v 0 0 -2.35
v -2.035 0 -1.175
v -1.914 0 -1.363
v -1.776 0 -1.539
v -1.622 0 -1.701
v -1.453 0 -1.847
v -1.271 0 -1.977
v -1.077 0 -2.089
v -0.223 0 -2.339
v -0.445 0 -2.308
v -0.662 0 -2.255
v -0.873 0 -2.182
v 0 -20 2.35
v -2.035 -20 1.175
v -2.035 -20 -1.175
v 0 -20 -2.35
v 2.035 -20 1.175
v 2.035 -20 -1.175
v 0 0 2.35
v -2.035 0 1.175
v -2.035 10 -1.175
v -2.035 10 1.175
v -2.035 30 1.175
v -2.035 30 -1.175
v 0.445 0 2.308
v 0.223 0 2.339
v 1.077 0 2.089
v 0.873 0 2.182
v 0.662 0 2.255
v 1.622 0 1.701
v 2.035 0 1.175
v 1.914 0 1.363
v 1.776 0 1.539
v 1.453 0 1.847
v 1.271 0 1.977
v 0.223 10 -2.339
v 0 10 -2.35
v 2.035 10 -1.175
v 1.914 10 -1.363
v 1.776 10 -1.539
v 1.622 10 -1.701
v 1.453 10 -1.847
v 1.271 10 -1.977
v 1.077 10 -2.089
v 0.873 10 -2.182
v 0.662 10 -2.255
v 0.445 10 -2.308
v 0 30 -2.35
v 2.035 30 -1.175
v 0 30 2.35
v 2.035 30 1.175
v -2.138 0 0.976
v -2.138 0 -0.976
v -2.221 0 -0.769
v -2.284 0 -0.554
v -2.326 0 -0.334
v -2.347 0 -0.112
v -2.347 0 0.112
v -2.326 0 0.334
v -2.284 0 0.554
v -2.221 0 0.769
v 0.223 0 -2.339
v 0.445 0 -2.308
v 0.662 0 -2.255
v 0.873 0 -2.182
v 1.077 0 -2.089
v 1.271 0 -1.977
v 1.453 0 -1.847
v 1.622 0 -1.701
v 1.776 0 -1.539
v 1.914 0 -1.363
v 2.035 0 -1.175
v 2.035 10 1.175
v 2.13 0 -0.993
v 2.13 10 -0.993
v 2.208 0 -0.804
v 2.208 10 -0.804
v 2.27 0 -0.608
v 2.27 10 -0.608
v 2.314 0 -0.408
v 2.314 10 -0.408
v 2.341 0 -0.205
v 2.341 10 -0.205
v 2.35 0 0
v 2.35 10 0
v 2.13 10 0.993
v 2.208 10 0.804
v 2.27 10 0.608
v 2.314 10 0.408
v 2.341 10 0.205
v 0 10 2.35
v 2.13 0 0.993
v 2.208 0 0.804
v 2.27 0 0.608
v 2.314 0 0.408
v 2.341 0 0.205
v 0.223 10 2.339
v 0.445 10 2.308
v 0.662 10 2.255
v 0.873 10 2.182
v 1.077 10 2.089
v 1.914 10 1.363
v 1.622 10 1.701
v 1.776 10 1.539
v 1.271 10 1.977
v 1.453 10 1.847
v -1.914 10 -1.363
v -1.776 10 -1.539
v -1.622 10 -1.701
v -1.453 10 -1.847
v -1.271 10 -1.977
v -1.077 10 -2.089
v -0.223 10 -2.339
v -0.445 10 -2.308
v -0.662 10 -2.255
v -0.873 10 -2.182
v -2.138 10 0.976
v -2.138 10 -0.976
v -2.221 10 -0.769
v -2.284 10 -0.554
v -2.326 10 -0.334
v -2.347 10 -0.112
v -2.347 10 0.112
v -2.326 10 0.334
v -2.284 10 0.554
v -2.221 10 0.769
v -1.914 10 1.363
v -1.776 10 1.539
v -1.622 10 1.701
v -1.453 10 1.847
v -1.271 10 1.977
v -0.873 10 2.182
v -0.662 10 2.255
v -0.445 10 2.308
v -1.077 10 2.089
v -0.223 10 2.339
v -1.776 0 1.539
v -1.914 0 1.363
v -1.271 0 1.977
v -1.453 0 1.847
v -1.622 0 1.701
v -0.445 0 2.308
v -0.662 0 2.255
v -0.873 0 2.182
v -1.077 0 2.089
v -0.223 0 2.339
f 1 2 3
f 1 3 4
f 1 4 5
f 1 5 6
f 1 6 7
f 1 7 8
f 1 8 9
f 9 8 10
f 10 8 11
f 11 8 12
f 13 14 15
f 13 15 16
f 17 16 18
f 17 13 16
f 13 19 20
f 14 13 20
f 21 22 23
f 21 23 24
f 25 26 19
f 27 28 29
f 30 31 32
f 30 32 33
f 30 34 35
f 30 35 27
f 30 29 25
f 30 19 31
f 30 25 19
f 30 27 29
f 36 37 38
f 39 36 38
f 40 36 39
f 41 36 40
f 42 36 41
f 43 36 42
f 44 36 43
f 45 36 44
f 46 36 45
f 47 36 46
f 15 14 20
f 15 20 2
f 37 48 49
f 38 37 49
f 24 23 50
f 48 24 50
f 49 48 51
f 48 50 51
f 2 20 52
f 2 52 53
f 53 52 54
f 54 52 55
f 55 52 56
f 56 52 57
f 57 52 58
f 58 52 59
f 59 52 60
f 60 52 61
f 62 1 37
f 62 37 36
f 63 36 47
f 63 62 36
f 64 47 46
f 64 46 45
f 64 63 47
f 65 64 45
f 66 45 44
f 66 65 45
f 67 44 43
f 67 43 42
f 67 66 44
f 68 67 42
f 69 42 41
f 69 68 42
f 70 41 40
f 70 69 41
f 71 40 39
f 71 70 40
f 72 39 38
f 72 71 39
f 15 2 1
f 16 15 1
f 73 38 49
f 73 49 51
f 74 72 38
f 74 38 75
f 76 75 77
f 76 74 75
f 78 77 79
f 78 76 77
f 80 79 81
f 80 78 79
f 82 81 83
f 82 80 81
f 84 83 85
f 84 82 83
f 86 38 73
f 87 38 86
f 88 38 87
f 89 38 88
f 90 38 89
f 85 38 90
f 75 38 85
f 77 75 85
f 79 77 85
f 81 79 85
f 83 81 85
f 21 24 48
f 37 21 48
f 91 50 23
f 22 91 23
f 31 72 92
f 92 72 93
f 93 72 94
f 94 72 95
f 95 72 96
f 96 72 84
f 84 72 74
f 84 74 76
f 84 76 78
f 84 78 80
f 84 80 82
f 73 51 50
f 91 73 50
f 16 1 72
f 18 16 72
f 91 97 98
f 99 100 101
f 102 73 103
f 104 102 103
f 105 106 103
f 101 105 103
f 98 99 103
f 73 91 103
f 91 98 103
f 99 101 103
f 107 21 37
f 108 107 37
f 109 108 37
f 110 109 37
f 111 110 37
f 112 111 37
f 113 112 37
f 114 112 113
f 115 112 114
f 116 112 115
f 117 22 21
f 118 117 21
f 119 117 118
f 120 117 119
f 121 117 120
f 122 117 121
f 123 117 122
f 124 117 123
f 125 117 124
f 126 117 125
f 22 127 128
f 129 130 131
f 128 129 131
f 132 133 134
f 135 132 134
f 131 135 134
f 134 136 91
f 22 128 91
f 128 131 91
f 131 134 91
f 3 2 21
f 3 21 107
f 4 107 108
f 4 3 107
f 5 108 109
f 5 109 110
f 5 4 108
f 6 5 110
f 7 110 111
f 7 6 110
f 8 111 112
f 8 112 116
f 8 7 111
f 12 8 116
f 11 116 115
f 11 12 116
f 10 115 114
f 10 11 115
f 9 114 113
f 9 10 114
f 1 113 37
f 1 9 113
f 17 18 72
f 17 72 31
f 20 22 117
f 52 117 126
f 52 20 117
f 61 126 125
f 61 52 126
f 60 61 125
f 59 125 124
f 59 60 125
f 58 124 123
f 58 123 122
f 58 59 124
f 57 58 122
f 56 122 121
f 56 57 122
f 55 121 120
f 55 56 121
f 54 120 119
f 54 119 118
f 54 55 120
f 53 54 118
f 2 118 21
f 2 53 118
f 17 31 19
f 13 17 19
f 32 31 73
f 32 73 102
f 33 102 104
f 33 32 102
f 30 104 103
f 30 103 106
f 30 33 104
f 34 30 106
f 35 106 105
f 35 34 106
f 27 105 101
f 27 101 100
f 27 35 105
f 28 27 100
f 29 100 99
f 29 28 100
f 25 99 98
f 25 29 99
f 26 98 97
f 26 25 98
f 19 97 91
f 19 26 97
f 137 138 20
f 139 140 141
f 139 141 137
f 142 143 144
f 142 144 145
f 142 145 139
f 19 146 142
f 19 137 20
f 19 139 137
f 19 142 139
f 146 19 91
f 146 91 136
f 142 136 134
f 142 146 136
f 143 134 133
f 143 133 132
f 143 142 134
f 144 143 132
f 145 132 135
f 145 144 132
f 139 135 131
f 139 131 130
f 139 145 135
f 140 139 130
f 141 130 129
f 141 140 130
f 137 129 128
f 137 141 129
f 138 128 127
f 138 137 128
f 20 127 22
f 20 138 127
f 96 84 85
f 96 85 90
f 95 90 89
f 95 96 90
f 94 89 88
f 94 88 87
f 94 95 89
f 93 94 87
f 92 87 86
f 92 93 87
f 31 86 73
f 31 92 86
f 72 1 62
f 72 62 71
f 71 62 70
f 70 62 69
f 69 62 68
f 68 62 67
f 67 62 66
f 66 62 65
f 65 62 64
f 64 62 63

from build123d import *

# Parameters (mm, degrees)
F1_DEPTH      = 20
F1_DEPTH_BACK = 30
F2_DEPTH      = 10


with BuildPart() as f1:
    # F0 (on Front) → F1 (new body, two sides)
    with BuildSketch(Plane.XZ) as f1_sk:
        Polygon((2.03516, -1.175), (2.03516, 1.175), (0, 2.35), (-2.03516, 1.175), (-2.03516, -1.175), (0, -2.35), align=None)
    extrude(amount=F1_DEPTH)
    extrude(f1_sk.sketch, amount=-F1_DEPTH_BACK)

    # F0 (on Front) → F2 (join)
    with BuildSketch(Plane.XZ):
        with BuildLine():
            Line((-2.03516, 1.175), (0, 2.35))
            ThreePointArc((0, 2.35), (-1.175, 2.03516), (-2.03516, 1.175))
        make_face()
        with BuildLine():
            Line((0, 2.35), (2.03516, 1.175))
            ThreePointArc((2.03516, 1.175), (1.175, 2.03516), (0, 2.35))
        make_face()
        with BuildLine():
            ThreePointArc((2.03516, -1.175), (2.269926, -0.608225), (2.35, 0))
            ThreePointArc((2.35, 0), (2.269926, 0.608225), (2.03516, 1.175))
            Line((2.03516, 1.175), (2.03516, -1.175))
        make_face()
        with BuildLine():
            ThreePointArc((0, -2.35), (1.175, -2.03516), (2.03516, -1.175))
            Line((2.03516, -1.175), (0, -2.35))
        make_face()
        Polygon((2.03516, -1.175), (2.03516, 1.175), (0, 2.35), (-2.03516, 1.175), (-2.03516, -1.175), (0, -2.35), align=None)
        with BuildLine():
            Line((-2.03516, -1.175), (-2.03516, 1.175))
            ThreePointArc((-2.03516, 1.175), (-2.35, 0), (-2.03516, -1.175))
        make_face()
        with BuildLine():
            ThreePointArc((-2.03516, -1.175), (-1.175, -2.03516), (0, -2.35))
            Line((0, -2.35), (-2.03516, -1.175))
        make_face()
    extrude(amount=-F2_DEPTH)


solid = f1.part
